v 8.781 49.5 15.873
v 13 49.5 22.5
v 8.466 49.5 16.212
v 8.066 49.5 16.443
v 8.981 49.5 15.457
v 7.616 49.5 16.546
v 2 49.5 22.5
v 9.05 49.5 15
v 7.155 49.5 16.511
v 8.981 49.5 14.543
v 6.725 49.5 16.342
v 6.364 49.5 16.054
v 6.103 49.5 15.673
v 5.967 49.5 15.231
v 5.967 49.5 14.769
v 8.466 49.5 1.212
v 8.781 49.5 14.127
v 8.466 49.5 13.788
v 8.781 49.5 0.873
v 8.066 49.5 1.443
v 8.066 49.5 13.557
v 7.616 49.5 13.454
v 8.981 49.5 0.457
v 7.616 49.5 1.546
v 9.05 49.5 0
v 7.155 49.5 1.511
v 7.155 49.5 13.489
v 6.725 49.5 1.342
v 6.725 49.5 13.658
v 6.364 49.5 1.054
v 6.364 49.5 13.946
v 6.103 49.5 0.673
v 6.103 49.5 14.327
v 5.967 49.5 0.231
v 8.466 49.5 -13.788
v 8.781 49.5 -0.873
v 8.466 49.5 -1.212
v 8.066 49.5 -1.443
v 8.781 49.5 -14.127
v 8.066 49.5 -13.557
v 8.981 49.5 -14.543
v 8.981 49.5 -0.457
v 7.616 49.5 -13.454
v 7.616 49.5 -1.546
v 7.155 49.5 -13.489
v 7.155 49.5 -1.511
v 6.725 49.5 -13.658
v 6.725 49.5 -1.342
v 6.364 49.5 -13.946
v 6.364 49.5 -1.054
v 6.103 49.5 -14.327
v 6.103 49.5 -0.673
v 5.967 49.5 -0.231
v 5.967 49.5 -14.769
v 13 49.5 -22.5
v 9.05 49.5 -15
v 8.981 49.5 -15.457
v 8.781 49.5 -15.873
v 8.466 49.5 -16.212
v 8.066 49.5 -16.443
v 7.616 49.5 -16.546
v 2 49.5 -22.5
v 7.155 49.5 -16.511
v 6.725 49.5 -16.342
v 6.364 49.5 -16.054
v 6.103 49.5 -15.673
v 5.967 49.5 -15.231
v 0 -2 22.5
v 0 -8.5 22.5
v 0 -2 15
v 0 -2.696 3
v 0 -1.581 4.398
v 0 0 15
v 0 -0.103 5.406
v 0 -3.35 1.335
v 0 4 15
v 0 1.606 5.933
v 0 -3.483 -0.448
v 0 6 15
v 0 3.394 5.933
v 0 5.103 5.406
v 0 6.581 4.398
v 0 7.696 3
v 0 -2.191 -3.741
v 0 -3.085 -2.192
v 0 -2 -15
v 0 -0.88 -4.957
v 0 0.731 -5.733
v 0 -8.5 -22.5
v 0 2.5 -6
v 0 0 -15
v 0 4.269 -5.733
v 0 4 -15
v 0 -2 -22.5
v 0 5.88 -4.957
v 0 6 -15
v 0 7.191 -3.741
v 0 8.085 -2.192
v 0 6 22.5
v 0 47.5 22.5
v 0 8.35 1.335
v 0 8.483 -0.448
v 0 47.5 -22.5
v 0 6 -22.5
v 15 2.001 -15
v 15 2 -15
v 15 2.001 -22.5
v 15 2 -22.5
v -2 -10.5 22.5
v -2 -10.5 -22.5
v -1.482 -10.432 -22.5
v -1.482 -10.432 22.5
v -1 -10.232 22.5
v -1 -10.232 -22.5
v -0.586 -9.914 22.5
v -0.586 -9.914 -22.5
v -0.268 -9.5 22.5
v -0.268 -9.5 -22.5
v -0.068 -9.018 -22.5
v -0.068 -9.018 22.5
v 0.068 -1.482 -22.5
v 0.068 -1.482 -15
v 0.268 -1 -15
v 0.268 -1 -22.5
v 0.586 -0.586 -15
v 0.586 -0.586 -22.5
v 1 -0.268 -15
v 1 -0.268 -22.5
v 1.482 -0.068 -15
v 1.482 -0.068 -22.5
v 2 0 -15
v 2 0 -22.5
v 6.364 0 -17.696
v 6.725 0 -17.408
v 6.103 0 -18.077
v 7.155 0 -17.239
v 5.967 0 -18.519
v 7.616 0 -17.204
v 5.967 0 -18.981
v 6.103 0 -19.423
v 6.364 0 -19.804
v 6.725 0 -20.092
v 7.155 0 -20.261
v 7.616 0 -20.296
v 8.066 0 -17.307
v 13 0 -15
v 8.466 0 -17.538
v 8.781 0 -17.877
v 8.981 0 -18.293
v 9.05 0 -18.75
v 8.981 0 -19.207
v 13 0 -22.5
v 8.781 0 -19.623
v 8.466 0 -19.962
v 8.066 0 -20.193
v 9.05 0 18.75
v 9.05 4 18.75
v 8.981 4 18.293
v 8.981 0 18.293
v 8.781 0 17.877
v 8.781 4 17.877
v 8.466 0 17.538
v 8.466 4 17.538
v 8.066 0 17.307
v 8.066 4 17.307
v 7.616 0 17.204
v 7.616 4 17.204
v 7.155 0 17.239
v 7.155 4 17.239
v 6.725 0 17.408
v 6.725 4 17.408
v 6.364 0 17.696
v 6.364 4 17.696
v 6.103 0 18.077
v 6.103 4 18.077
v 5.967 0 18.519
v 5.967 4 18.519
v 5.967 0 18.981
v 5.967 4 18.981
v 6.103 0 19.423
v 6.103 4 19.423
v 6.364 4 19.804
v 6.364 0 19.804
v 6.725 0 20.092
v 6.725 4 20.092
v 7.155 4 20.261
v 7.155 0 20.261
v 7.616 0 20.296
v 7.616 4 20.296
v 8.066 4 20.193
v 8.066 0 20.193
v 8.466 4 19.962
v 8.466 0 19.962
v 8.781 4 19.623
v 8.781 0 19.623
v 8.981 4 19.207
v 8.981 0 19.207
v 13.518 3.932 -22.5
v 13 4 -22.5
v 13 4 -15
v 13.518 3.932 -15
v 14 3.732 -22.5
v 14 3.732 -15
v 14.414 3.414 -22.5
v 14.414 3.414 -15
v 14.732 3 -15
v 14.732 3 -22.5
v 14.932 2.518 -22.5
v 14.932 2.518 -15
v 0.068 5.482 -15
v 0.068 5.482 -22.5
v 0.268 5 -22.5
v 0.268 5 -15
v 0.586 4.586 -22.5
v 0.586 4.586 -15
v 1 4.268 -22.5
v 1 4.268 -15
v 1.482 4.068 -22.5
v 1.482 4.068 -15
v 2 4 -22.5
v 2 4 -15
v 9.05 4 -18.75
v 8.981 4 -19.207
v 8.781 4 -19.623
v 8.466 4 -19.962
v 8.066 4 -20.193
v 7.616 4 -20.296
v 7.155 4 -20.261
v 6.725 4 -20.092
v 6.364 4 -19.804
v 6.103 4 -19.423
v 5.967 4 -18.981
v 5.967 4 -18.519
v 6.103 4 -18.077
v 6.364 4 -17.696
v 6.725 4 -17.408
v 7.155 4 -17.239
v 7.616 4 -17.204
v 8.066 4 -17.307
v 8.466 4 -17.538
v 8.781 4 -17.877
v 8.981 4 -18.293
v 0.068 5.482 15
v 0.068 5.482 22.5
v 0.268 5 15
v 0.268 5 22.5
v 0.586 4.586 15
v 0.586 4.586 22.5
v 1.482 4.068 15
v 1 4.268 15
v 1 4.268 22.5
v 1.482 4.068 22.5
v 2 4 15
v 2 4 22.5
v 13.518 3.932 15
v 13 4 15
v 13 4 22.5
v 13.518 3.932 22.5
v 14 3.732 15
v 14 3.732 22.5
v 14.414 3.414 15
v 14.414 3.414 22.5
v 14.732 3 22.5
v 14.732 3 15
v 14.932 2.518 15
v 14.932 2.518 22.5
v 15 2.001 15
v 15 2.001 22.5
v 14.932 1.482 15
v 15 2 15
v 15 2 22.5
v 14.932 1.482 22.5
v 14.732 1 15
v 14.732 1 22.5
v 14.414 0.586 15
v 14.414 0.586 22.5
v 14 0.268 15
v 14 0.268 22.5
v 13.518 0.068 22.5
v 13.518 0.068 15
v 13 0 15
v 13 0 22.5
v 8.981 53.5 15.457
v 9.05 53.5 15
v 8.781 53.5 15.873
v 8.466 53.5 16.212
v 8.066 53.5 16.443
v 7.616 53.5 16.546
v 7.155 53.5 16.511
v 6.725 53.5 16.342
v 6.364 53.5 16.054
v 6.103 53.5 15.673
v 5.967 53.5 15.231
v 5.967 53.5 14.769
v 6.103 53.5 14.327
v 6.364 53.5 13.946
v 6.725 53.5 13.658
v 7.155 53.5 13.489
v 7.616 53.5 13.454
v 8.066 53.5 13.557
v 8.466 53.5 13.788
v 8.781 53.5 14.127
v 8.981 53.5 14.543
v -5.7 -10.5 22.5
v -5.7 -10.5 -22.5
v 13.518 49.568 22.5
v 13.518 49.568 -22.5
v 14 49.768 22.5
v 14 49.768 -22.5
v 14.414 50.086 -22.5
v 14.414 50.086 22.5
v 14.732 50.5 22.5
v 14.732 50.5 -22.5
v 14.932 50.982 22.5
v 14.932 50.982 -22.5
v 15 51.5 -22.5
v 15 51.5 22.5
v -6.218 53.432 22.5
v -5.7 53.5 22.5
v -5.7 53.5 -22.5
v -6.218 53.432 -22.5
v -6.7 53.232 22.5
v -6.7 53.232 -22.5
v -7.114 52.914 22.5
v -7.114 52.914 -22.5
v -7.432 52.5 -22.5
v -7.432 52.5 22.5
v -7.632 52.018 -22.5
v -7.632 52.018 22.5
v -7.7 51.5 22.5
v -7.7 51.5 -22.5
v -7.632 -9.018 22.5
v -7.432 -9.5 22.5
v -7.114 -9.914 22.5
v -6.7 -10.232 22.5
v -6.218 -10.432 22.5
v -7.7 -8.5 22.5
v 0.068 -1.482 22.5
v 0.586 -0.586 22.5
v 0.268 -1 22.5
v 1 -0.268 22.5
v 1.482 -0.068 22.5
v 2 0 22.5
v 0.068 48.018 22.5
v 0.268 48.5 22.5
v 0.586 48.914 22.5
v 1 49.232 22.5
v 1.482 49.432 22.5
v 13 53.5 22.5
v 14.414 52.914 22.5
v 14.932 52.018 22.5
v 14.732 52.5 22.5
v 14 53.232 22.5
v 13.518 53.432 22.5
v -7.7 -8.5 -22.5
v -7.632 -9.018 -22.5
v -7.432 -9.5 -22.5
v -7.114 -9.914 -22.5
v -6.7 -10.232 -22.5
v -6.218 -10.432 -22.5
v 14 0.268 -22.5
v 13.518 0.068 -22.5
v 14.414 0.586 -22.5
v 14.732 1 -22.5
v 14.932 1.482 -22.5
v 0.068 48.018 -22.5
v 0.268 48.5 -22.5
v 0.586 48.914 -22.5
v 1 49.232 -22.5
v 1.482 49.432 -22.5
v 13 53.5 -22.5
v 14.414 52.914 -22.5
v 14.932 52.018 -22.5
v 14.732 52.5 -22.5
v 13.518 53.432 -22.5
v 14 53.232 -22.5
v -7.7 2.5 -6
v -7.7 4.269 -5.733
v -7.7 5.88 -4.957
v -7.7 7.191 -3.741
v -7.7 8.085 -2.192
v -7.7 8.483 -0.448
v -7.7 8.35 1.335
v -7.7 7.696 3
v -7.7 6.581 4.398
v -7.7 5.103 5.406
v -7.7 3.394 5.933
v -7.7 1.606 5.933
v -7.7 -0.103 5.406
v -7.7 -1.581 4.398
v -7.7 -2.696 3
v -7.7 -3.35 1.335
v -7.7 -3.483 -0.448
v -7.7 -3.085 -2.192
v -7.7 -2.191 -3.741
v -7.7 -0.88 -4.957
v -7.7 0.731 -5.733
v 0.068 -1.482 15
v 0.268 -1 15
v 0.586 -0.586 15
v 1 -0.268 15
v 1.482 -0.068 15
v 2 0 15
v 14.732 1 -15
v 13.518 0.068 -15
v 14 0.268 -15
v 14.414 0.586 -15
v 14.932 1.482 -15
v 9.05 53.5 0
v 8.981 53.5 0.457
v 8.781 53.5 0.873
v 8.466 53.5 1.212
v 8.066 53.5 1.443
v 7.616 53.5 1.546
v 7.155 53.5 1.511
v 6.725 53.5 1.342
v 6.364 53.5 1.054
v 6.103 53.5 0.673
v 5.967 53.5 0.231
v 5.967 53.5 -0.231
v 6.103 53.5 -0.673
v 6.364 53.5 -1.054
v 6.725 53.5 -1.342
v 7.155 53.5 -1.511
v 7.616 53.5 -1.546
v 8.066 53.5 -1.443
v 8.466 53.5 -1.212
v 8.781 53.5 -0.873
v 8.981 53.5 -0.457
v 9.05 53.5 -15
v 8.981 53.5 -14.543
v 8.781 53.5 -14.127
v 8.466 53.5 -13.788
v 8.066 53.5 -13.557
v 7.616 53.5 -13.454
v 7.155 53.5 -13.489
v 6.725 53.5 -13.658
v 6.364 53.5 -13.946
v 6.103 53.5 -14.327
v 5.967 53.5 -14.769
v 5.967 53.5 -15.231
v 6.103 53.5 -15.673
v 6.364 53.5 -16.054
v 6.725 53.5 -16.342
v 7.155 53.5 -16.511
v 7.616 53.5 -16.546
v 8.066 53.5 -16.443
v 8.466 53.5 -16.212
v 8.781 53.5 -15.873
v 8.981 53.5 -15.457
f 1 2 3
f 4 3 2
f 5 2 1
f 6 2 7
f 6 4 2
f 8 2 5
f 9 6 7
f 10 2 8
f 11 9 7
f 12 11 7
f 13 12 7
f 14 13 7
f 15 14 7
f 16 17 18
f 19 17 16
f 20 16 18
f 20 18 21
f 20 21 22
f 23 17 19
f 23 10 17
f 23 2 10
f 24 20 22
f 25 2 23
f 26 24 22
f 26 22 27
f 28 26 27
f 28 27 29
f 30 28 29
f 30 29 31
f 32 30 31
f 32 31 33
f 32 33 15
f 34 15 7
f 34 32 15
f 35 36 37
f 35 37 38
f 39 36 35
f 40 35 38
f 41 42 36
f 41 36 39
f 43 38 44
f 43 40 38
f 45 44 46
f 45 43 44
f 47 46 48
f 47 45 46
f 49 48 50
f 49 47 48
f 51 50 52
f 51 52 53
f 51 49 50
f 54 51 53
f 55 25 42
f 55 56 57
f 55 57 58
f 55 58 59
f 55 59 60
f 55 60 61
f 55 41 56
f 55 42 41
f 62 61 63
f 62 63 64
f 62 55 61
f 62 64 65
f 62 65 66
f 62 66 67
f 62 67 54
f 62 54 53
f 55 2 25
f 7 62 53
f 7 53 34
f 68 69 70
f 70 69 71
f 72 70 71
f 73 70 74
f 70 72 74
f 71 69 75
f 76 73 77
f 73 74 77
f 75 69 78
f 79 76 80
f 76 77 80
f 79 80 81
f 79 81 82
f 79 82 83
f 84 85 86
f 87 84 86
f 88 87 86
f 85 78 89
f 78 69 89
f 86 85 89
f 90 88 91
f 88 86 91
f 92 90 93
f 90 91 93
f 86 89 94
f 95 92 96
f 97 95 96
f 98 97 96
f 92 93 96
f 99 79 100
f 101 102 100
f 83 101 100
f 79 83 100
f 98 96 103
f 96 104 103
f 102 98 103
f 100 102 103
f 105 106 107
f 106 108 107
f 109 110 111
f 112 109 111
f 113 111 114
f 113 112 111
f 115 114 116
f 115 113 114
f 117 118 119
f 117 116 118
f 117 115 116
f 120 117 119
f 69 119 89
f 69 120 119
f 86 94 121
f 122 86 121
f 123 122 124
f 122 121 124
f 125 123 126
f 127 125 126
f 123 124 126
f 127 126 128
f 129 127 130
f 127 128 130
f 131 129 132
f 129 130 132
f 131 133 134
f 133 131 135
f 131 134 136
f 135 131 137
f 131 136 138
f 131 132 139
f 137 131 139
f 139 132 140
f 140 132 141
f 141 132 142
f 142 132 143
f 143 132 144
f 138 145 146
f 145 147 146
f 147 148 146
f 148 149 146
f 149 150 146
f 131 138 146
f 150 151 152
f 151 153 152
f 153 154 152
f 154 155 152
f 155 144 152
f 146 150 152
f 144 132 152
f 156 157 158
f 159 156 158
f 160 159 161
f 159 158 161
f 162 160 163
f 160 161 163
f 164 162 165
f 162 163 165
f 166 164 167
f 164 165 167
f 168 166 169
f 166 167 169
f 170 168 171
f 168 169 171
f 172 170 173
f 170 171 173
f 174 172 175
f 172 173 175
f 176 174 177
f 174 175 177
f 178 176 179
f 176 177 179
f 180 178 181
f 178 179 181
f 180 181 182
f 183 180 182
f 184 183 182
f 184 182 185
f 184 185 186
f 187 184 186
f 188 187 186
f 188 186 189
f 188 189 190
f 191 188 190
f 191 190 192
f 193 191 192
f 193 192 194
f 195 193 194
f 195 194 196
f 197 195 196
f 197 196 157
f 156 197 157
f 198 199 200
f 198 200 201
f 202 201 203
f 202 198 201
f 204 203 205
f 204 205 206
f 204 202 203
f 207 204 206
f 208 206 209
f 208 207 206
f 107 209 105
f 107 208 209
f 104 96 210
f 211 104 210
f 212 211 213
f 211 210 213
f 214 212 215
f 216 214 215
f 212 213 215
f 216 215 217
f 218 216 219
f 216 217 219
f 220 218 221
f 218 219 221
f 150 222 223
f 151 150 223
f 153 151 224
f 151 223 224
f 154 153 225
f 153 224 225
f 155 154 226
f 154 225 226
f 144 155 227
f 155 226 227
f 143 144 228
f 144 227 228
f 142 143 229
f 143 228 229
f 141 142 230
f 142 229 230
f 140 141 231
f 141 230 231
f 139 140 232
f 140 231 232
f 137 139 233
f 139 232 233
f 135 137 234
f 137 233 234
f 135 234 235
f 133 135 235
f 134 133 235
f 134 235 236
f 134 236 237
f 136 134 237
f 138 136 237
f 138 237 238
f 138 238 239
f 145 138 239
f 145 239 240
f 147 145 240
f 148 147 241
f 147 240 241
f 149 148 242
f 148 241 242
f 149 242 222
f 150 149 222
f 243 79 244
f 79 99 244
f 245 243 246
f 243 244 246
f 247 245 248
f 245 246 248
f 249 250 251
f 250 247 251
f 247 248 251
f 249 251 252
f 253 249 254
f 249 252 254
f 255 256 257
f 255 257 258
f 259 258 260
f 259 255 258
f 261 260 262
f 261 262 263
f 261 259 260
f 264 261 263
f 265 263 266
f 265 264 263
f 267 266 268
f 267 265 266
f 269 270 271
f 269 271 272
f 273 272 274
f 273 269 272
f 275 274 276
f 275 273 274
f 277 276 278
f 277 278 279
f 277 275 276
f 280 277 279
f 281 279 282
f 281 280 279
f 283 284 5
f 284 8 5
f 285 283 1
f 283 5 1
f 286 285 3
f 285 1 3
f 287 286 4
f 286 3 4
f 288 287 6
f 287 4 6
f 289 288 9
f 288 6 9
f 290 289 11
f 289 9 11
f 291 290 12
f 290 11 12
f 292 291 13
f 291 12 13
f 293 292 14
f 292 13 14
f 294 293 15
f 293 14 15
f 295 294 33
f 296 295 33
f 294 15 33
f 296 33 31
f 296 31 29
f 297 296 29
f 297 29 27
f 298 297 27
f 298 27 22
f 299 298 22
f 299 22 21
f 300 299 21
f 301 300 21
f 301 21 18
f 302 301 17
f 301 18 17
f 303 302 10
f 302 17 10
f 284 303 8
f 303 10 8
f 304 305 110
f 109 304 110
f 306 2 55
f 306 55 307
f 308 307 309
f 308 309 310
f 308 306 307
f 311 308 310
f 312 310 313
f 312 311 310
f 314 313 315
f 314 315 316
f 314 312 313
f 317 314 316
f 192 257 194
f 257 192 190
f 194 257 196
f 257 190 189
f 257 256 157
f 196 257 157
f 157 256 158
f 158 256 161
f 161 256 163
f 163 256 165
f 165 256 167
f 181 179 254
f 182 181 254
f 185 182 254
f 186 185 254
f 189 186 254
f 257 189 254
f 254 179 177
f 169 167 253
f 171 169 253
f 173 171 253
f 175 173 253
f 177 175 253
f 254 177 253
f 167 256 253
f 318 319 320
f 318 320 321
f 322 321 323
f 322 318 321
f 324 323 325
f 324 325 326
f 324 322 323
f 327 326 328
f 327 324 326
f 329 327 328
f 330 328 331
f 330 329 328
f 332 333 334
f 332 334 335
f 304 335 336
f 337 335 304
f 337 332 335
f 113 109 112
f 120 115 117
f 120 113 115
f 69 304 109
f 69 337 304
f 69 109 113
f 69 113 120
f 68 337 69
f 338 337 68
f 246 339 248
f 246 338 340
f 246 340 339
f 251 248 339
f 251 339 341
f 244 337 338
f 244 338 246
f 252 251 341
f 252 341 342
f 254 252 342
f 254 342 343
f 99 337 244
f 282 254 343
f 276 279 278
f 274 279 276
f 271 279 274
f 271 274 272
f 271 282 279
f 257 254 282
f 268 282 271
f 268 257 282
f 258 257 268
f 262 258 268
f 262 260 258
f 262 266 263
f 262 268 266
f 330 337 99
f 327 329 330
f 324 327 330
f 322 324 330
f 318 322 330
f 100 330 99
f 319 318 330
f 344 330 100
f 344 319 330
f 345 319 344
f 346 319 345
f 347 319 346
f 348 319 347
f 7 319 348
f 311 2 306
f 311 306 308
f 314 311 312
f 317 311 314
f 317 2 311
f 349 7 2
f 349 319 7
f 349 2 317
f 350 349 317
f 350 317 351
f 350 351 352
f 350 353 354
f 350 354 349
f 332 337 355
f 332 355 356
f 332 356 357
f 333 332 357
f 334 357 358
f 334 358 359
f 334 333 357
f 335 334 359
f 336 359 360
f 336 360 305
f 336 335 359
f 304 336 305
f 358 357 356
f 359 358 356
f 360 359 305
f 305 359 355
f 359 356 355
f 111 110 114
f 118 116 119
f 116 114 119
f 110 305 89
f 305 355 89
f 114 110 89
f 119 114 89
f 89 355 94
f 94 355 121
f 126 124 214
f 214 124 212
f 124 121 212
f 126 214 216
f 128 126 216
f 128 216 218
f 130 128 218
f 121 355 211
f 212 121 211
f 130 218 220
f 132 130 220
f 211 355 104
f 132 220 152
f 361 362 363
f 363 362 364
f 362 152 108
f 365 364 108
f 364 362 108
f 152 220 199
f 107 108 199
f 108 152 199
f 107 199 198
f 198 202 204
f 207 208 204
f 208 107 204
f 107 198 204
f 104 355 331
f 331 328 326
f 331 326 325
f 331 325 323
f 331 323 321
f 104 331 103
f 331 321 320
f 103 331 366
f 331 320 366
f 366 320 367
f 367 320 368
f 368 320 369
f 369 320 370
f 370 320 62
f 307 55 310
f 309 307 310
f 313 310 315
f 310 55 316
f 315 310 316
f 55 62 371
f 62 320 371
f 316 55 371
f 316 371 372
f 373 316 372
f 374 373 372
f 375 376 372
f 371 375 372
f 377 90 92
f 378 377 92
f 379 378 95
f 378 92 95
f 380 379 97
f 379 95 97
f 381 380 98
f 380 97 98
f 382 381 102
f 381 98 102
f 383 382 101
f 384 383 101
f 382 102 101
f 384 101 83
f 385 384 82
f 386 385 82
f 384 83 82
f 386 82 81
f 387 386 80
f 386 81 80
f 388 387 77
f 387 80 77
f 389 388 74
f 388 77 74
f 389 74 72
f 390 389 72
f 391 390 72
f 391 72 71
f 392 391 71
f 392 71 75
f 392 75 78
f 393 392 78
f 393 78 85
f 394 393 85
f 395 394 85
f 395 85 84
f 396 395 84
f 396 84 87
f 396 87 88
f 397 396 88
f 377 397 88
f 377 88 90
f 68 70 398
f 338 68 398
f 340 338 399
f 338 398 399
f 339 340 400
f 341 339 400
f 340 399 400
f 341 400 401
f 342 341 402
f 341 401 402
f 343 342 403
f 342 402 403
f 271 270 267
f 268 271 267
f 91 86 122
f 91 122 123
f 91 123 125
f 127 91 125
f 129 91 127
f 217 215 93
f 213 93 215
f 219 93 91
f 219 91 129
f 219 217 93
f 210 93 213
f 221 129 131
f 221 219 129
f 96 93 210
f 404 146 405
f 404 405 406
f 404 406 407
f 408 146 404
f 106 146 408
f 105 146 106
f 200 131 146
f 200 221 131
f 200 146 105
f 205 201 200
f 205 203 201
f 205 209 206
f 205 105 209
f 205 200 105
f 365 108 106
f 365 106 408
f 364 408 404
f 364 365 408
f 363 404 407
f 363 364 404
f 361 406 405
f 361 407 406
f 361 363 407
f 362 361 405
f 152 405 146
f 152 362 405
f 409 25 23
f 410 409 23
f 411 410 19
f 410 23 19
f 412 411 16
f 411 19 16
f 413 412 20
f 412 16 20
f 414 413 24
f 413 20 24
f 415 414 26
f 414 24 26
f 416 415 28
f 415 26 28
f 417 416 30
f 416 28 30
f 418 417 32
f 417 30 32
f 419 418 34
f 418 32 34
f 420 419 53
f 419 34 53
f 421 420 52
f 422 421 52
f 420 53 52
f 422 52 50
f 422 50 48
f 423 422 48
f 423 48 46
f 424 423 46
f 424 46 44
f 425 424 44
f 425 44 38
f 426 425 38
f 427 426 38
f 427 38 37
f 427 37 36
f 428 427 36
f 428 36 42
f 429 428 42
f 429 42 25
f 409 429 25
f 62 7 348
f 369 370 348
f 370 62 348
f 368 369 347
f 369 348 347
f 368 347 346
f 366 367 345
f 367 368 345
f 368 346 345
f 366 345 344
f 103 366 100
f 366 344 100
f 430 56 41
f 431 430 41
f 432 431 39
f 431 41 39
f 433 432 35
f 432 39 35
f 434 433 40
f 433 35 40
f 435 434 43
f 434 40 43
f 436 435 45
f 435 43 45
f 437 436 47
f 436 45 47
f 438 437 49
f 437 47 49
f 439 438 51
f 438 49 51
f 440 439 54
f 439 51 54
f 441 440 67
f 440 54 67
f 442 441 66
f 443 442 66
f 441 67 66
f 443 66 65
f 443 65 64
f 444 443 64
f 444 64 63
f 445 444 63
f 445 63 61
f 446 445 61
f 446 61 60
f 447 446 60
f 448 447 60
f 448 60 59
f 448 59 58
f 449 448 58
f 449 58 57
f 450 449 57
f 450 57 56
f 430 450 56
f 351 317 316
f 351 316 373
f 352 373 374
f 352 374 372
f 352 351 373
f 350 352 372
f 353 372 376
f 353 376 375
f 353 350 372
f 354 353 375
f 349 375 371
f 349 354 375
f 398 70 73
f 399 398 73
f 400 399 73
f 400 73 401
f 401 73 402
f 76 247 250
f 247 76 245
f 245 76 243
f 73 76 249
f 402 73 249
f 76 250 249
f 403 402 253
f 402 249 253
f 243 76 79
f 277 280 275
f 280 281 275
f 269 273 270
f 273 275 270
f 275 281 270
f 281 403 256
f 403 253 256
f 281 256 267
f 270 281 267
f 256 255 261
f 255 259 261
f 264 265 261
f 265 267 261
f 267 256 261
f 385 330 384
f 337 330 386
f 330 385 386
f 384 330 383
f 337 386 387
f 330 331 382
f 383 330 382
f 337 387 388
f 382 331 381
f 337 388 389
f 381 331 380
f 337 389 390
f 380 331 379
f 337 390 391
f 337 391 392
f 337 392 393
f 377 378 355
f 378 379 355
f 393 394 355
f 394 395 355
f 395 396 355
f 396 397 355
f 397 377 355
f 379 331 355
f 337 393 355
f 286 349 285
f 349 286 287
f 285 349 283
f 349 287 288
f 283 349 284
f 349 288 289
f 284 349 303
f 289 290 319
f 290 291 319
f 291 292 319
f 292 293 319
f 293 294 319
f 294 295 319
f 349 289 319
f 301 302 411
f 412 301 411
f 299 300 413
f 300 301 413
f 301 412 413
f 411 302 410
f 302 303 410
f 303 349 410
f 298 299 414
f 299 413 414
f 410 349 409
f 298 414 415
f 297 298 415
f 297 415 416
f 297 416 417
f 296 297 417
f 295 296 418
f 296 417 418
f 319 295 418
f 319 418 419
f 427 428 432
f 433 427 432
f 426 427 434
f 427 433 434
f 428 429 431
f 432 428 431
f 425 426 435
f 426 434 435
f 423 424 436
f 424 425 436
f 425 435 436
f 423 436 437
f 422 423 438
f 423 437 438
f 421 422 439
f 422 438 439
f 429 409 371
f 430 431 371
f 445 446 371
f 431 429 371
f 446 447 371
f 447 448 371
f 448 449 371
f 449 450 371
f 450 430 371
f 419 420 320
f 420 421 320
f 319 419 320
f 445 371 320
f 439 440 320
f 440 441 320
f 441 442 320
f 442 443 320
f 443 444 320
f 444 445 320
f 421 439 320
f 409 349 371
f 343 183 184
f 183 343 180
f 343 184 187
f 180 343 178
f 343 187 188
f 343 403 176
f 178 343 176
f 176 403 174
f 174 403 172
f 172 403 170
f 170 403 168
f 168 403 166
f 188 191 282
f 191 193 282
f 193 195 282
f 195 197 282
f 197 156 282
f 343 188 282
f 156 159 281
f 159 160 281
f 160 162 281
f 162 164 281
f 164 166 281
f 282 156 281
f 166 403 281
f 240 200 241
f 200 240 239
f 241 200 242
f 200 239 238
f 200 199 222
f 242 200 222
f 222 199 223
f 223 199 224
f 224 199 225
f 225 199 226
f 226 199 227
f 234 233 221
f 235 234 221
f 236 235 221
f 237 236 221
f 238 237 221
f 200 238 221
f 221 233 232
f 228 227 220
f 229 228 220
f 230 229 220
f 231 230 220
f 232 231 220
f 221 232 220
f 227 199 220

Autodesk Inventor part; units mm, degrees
ref_plane "YZ Plane" through (0, 0, 0) normal (1, 0, 0) x (0, 1, 0)
ref_plane "XZ Plane" through (0, 0, 0) normal (0, 1, 0) x (-1, 0, 0)
ref_plane "XY Plane" through (0, 0, 0) normal (0, 0, 1) x (1, 0, 0)
sketch "Sketch1" plane through (0, 0, 0) normal (0, 0, 1) x (1, 0, 0)
  line L0 (0, 0) -> (15, 0)
  line L1 (15, 0) -> (15, 4)
  line L2 (15, 4) -> (0, 4)
  line L3 (0, 4) -> (0, 0)
  line L4 (0, 53.5) -> (15, 53.5)
  line L5 (15, 53.5) -> (15, 49.5)
  line L6 (15, 49.5) -> (0, 49.5)
  line L7 (0, 49.5) -> (0, 53.5)
  line L8 (0, 53.5) -> (-7.7, 53.5)
  line L9 (-7.7, 53.5) -> (-7.7, -10.5)
  line L10 (-7.7, -10.5) -> (0, -10.5)
  line L11 (0, -10.5) -> (0, 53.5)
  point P0 (0, 49.5)
  dimension "d0" = 15
  dimension "d1" = 4
  dimension "d2" = 15
  dimension "d3" = 4
  dimension "d4" = 45.5
  dimension "d5" = 7.7
  dimension "d6" = 64
extrude "Extrusion1" add sketch "Sketch1" along normal mid plane 45
extrude "Extrusion2" cut sketch "Sketch1" along normal mid plane 30 contours L3 L2 L1 L0
sketch "Sketch3" plane through (0, 49.5, 22.5) normal (0, -1, 0) x (1, 0, 0)
  line L0 (0, 0) -> (15, 0) projected
  line L1 (7.5, 0) -> (7.5, -45)
  line L2 (15, -45) -> (0, -45) projected
  circle A0 centre (7.5, -3.75) radius 1.55
  circle A1 centre (7.5, -7.5) radius 1.55
  circle A2 centre (7.5, -22.5) radius 1.55
  circle A3 centre (7.5, -37.5) radius 1.55
  circle A4 centre (7.5, -41.25) radius 1.55
  line L3 (0, 0) -> (15, 0) projected
  line L4 (15, -45) -> (0, -45) projected
  line L5 (15, -45) -> (15, 0) projected
  point P0 (0, -22.5)
  dimension "d11" = 3.1
  dimension "d12" = 3.1
  dimension "d13" = 3.1
  dimension "d14" = 3.1
  dimension "d15" = 3.1
  dimension "d16" = 3.75
  dimension "d17" = 7.5
  dimension "d18" = 3.75
  dimension "d19" = 7.5
  dimension "d20" = 7.5
extrude "Extrusion3" cut sketch "Sketch3" along normal through all contours A0 L1 | L1 A0 | A4 L1 | L1 A4
extrude "Extrusion4" cut sketch "Sketch3" against normal through all contours A1 L1 | L1 A1 | A2 L1 | L1 A2 | A3 L1 | L1 A3
sketch "Sketch4" plane through (0, 4, -22.5) normal (1, 0, 0) x (0, 0, -1)
  circle A0 centre (-22.5, -1.5) radius 6
  line L0 (-45, -14.5) -> (0, -14.5) projected
  line L1 (-22.5, -1.5) -> (-22.5, -14.5) construction
  point P0 (-22.5, -4)
  dimension "d29" = 12
  dimension "d40" = 13
extrude "Extrusion6" cut sketch "Sketch4" against normal through all
fillet "Fillet1" radius 2 14 edges at (0, 49.5, 0) (15, 49.5, 0) (15, 53.5, 0) (-7.7, 53.5, 0) (0, 4, 18.75) (0, 4, -18.75) (15, 4, -18.75) (15, 0, -18.75) (15, 4, 18.75) (15, 0, 18.75) (0, -10.5, 0) (0, 0, 18.75) (0, 0, -18.75) (-7.7, -10.5, 0)
properties part number "ThickBearingBracket" material "PC/ABS Plastic"
